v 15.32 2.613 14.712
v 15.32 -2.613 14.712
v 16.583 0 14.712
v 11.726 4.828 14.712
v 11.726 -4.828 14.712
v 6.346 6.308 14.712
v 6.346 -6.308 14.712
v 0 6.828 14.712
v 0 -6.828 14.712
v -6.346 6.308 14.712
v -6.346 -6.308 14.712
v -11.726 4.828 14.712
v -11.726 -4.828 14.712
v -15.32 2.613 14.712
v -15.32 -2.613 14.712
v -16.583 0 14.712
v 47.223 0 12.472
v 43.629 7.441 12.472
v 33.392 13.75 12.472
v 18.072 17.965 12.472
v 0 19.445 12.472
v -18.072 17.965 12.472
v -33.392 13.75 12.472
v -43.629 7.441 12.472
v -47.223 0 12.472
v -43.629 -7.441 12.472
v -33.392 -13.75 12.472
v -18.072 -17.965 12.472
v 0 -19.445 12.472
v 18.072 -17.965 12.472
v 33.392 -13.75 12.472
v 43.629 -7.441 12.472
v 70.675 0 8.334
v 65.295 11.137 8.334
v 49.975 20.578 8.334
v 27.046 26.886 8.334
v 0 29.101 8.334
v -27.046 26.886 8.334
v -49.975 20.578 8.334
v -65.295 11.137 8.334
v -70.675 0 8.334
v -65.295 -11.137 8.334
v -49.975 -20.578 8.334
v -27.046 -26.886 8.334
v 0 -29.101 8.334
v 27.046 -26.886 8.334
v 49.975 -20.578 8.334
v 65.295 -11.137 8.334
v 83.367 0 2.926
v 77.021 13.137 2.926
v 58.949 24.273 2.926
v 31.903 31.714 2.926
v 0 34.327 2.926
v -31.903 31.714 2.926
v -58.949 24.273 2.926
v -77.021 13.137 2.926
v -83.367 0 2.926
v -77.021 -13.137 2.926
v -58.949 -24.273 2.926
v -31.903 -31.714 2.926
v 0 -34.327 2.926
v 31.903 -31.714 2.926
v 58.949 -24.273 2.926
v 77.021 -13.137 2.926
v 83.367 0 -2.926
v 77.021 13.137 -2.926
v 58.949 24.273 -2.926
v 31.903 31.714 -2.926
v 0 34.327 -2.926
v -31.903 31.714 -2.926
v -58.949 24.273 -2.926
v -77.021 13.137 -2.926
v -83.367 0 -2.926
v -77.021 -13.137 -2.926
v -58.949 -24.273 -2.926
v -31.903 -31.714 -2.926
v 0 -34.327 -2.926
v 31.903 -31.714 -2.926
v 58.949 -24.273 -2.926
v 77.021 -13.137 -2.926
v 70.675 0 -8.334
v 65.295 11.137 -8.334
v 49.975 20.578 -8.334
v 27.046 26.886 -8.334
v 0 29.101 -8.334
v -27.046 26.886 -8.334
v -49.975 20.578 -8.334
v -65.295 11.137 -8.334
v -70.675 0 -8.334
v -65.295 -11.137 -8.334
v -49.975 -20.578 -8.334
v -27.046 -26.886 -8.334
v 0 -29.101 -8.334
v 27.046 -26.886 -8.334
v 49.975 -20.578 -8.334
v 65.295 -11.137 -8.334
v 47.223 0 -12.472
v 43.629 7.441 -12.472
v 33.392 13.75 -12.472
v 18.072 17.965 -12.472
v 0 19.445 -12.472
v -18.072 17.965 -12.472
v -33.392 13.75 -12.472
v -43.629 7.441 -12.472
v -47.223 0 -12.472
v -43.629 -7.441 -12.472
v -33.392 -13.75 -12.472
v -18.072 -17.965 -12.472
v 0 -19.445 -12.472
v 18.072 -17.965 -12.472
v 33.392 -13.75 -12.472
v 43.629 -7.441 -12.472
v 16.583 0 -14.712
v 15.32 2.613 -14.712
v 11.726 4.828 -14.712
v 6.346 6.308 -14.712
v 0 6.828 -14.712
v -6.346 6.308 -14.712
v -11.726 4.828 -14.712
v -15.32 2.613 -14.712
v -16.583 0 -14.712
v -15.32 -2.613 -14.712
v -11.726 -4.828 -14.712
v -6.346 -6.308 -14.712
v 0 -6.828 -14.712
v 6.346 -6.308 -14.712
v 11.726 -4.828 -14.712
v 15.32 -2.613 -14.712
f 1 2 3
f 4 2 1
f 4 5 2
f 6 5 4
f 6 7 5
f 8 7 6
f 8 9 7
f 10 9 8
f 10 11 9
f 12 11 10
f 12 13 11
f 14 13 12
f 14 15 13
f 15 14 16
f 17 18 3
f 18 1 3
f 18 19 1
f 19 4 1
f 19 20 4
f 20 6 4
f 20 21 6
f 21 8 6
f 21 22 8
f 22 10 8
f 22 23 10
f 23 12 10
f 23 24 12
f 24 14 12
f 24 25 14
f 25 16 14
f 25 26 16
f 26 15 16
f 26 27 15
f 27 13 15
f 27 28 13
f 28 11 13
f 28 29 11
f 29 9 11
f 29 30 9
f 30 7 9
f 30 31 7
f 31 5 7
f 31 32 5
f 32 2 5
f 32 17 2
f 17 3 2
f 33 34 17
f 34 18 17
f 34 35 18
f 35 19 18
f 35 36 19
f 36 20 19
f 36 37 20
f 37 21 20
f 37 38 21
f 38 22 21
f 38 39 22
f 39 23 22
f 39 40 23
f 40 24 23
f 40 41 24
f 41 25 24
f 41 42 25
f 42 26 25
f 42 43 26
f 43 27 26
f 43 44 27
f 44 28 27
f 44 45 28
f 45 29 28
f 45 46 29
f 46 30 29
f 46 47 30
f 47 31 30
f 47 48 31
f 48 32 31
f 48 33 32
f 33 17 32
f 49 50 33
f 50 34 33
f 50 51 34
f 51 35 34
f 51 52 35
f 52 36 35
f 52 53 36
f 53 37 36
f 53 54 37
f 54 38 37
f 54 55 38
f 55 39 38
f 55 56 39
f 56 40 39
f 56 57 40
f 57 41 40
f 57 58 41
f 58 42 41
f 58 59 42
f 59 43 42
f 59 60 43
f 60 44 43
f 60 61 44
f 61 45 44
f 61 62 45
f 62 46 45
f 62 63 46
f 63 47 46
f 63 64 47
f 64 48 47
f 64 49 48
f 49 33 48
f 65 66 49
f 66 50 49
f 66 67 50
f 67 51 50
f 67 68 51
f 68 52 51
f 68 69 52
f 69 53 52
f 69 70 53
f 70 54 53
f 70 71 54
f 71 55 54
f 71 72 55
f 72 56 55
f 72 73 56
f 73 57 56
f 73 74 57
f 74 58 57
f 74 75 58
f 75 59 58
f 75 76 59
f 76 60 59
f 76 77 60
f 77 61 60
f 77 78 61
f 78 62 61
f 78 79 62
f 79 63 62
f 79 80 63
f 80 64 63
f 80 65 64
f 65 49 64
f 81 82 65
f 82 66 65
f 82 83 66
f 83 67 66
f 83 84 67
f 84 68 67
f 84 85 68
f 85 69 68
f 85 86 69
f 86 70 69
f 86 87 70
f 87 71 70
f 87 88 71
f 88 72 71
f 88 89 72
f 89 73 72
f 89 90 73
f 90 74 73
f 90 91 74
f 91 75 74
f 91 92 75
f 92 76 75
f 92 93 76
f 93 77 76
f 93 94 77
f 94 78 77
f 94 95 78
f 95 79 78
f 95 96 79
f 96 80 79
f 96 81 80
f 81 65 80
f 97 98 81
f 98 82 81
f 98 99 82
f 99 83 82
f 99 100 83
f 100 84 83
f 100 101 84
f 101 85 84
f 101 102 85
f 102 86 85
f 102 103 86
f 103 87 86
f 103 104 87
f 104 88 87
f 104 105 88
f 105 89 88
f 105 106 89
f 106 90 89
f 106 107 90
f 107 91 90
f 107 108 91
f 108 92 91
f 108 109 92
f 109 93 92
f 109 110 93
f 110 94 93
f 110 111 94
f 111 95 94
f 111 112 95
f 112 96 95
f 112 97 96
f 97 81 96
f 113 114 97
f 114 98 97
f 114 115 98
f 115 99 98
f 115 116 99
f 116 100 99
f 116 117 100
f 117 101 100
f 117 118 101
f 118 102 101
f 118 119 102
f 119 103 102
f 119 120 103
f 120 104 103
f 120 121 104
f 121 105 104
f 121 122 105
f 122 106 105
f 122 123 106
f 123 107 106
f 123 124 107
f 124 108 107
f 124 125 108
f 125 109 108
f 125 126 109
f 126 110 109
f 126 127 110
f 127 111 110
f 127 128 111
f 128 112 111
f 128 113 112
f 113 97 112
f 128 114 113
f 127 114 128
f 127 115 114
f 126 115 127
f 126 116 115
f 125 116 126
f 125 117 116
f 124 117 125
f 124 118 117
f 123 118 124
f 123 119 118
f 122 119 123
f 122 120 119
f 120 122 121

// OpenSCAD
// Generated by SolidPython 1.0.1 on 2020-07-29 00:46:52


scale(v = [17, 7, 3]) {
	sphere(r = 5);
}
/***********************************************
*********      SolidPython code:      **********
************************************************
 
# import packages: SolidPython
from solid import *
from solid.utils import *
from itertools import chain, combinations, permutations


class Resize:

    def __init__(self, scad_file):
        self.scad_file = scad_file
        #self.scad_file = import_scad(scad_file)
        # cone/cylinder param:
        self.r1 = 0
        self.r2 = 0
        self.h = 0
        # rectangular prism param:
        self.w = 0
        self.l = 0
        # ellipse param:
        self.r = 0

    # import OpenScad code (file name corresponds to shape)


    # classify shape + parameters
    def assign(self, param1, param2, param3):
        if self.scad_file == 'cone.scad':
            self.r1 = param1
            self.r2 = param2
            self.h = param3
        elif self.scad_file == 'cylinder.scad':
            self.r1 = param1
            self.r2 = param2
            self.h = param3
        elif self.scad_file == 'rectangularPrism.scad':
            self.h = param1
            self.l = param2
            self.w = param3
        else:
            self.r = param1
            self.h = param2

    # resize parameters
    def iterate(self):
        x = range(3, 20, 2)
        i = 1
        if self.scad_file == 'cone.scad':
            tempList = list(permutations(x, 2))
            for temp in tempList:
                param1 = temp[0]
                param2 = temp[1]
                filepath = 'produced_scad_files/' + 'cone' + str(param1) + '_' + str(param2) + '_' + '.scad'
                scad_render_to_file(cylinder(h=param1, r1=param2, r2=0), filepath)

        elif self.scad_file == 'cylinder.scad':
            tempList = list(permutations(x, 3))
            for temp in tempList:
                param1 = temp[0]
                param2 = temp[1]
                filepath = 'produced_scad_files/' + 'cylinder' + str(param1) + '_' + str(param2) + '_' + '.scad'
                scad_render_to_file(cylinder(h=param1, r1=param2, r2=param2), filepath)

        elif self.scad_file == 'rectangularPrism.scad':
            tempList = list(permutations(x, 3))
            for temp in tempList:
                param1 = temp[0]
                param2 = temp[1]
                param3 = temp[2]
                filepath = 'produced_scad_files/' + 'rectangularPrism' + str(param1) + '_' + str(param2) + '_' + str(
                    param3) + '.scad'
                scad_render_to_file(cube(size=(param1, param2, param3)), filepath)

        elif self.scad_file == 'ellipse.scad':
            tempList = list(permutations(x, 4))
            for temp in tempList:
                param1 = temp[0]
                param2 = temp[1]
                param3 = temp[2]
                param4 = temp[3]
                filepath = 'produced_scad_files/' + 'ellipse' + str(param1) + '_' + str(param2) + '_' + str(param3) + '_' + str(param4) + '.scad'
                scad_render_to_file(scale([param1, param2, param3])(sphere(r=param4)), filepath)

    def render_to_scadfile(self):
        scad_render_to_file(scad, 'example.scad') 
 
************************************************/
